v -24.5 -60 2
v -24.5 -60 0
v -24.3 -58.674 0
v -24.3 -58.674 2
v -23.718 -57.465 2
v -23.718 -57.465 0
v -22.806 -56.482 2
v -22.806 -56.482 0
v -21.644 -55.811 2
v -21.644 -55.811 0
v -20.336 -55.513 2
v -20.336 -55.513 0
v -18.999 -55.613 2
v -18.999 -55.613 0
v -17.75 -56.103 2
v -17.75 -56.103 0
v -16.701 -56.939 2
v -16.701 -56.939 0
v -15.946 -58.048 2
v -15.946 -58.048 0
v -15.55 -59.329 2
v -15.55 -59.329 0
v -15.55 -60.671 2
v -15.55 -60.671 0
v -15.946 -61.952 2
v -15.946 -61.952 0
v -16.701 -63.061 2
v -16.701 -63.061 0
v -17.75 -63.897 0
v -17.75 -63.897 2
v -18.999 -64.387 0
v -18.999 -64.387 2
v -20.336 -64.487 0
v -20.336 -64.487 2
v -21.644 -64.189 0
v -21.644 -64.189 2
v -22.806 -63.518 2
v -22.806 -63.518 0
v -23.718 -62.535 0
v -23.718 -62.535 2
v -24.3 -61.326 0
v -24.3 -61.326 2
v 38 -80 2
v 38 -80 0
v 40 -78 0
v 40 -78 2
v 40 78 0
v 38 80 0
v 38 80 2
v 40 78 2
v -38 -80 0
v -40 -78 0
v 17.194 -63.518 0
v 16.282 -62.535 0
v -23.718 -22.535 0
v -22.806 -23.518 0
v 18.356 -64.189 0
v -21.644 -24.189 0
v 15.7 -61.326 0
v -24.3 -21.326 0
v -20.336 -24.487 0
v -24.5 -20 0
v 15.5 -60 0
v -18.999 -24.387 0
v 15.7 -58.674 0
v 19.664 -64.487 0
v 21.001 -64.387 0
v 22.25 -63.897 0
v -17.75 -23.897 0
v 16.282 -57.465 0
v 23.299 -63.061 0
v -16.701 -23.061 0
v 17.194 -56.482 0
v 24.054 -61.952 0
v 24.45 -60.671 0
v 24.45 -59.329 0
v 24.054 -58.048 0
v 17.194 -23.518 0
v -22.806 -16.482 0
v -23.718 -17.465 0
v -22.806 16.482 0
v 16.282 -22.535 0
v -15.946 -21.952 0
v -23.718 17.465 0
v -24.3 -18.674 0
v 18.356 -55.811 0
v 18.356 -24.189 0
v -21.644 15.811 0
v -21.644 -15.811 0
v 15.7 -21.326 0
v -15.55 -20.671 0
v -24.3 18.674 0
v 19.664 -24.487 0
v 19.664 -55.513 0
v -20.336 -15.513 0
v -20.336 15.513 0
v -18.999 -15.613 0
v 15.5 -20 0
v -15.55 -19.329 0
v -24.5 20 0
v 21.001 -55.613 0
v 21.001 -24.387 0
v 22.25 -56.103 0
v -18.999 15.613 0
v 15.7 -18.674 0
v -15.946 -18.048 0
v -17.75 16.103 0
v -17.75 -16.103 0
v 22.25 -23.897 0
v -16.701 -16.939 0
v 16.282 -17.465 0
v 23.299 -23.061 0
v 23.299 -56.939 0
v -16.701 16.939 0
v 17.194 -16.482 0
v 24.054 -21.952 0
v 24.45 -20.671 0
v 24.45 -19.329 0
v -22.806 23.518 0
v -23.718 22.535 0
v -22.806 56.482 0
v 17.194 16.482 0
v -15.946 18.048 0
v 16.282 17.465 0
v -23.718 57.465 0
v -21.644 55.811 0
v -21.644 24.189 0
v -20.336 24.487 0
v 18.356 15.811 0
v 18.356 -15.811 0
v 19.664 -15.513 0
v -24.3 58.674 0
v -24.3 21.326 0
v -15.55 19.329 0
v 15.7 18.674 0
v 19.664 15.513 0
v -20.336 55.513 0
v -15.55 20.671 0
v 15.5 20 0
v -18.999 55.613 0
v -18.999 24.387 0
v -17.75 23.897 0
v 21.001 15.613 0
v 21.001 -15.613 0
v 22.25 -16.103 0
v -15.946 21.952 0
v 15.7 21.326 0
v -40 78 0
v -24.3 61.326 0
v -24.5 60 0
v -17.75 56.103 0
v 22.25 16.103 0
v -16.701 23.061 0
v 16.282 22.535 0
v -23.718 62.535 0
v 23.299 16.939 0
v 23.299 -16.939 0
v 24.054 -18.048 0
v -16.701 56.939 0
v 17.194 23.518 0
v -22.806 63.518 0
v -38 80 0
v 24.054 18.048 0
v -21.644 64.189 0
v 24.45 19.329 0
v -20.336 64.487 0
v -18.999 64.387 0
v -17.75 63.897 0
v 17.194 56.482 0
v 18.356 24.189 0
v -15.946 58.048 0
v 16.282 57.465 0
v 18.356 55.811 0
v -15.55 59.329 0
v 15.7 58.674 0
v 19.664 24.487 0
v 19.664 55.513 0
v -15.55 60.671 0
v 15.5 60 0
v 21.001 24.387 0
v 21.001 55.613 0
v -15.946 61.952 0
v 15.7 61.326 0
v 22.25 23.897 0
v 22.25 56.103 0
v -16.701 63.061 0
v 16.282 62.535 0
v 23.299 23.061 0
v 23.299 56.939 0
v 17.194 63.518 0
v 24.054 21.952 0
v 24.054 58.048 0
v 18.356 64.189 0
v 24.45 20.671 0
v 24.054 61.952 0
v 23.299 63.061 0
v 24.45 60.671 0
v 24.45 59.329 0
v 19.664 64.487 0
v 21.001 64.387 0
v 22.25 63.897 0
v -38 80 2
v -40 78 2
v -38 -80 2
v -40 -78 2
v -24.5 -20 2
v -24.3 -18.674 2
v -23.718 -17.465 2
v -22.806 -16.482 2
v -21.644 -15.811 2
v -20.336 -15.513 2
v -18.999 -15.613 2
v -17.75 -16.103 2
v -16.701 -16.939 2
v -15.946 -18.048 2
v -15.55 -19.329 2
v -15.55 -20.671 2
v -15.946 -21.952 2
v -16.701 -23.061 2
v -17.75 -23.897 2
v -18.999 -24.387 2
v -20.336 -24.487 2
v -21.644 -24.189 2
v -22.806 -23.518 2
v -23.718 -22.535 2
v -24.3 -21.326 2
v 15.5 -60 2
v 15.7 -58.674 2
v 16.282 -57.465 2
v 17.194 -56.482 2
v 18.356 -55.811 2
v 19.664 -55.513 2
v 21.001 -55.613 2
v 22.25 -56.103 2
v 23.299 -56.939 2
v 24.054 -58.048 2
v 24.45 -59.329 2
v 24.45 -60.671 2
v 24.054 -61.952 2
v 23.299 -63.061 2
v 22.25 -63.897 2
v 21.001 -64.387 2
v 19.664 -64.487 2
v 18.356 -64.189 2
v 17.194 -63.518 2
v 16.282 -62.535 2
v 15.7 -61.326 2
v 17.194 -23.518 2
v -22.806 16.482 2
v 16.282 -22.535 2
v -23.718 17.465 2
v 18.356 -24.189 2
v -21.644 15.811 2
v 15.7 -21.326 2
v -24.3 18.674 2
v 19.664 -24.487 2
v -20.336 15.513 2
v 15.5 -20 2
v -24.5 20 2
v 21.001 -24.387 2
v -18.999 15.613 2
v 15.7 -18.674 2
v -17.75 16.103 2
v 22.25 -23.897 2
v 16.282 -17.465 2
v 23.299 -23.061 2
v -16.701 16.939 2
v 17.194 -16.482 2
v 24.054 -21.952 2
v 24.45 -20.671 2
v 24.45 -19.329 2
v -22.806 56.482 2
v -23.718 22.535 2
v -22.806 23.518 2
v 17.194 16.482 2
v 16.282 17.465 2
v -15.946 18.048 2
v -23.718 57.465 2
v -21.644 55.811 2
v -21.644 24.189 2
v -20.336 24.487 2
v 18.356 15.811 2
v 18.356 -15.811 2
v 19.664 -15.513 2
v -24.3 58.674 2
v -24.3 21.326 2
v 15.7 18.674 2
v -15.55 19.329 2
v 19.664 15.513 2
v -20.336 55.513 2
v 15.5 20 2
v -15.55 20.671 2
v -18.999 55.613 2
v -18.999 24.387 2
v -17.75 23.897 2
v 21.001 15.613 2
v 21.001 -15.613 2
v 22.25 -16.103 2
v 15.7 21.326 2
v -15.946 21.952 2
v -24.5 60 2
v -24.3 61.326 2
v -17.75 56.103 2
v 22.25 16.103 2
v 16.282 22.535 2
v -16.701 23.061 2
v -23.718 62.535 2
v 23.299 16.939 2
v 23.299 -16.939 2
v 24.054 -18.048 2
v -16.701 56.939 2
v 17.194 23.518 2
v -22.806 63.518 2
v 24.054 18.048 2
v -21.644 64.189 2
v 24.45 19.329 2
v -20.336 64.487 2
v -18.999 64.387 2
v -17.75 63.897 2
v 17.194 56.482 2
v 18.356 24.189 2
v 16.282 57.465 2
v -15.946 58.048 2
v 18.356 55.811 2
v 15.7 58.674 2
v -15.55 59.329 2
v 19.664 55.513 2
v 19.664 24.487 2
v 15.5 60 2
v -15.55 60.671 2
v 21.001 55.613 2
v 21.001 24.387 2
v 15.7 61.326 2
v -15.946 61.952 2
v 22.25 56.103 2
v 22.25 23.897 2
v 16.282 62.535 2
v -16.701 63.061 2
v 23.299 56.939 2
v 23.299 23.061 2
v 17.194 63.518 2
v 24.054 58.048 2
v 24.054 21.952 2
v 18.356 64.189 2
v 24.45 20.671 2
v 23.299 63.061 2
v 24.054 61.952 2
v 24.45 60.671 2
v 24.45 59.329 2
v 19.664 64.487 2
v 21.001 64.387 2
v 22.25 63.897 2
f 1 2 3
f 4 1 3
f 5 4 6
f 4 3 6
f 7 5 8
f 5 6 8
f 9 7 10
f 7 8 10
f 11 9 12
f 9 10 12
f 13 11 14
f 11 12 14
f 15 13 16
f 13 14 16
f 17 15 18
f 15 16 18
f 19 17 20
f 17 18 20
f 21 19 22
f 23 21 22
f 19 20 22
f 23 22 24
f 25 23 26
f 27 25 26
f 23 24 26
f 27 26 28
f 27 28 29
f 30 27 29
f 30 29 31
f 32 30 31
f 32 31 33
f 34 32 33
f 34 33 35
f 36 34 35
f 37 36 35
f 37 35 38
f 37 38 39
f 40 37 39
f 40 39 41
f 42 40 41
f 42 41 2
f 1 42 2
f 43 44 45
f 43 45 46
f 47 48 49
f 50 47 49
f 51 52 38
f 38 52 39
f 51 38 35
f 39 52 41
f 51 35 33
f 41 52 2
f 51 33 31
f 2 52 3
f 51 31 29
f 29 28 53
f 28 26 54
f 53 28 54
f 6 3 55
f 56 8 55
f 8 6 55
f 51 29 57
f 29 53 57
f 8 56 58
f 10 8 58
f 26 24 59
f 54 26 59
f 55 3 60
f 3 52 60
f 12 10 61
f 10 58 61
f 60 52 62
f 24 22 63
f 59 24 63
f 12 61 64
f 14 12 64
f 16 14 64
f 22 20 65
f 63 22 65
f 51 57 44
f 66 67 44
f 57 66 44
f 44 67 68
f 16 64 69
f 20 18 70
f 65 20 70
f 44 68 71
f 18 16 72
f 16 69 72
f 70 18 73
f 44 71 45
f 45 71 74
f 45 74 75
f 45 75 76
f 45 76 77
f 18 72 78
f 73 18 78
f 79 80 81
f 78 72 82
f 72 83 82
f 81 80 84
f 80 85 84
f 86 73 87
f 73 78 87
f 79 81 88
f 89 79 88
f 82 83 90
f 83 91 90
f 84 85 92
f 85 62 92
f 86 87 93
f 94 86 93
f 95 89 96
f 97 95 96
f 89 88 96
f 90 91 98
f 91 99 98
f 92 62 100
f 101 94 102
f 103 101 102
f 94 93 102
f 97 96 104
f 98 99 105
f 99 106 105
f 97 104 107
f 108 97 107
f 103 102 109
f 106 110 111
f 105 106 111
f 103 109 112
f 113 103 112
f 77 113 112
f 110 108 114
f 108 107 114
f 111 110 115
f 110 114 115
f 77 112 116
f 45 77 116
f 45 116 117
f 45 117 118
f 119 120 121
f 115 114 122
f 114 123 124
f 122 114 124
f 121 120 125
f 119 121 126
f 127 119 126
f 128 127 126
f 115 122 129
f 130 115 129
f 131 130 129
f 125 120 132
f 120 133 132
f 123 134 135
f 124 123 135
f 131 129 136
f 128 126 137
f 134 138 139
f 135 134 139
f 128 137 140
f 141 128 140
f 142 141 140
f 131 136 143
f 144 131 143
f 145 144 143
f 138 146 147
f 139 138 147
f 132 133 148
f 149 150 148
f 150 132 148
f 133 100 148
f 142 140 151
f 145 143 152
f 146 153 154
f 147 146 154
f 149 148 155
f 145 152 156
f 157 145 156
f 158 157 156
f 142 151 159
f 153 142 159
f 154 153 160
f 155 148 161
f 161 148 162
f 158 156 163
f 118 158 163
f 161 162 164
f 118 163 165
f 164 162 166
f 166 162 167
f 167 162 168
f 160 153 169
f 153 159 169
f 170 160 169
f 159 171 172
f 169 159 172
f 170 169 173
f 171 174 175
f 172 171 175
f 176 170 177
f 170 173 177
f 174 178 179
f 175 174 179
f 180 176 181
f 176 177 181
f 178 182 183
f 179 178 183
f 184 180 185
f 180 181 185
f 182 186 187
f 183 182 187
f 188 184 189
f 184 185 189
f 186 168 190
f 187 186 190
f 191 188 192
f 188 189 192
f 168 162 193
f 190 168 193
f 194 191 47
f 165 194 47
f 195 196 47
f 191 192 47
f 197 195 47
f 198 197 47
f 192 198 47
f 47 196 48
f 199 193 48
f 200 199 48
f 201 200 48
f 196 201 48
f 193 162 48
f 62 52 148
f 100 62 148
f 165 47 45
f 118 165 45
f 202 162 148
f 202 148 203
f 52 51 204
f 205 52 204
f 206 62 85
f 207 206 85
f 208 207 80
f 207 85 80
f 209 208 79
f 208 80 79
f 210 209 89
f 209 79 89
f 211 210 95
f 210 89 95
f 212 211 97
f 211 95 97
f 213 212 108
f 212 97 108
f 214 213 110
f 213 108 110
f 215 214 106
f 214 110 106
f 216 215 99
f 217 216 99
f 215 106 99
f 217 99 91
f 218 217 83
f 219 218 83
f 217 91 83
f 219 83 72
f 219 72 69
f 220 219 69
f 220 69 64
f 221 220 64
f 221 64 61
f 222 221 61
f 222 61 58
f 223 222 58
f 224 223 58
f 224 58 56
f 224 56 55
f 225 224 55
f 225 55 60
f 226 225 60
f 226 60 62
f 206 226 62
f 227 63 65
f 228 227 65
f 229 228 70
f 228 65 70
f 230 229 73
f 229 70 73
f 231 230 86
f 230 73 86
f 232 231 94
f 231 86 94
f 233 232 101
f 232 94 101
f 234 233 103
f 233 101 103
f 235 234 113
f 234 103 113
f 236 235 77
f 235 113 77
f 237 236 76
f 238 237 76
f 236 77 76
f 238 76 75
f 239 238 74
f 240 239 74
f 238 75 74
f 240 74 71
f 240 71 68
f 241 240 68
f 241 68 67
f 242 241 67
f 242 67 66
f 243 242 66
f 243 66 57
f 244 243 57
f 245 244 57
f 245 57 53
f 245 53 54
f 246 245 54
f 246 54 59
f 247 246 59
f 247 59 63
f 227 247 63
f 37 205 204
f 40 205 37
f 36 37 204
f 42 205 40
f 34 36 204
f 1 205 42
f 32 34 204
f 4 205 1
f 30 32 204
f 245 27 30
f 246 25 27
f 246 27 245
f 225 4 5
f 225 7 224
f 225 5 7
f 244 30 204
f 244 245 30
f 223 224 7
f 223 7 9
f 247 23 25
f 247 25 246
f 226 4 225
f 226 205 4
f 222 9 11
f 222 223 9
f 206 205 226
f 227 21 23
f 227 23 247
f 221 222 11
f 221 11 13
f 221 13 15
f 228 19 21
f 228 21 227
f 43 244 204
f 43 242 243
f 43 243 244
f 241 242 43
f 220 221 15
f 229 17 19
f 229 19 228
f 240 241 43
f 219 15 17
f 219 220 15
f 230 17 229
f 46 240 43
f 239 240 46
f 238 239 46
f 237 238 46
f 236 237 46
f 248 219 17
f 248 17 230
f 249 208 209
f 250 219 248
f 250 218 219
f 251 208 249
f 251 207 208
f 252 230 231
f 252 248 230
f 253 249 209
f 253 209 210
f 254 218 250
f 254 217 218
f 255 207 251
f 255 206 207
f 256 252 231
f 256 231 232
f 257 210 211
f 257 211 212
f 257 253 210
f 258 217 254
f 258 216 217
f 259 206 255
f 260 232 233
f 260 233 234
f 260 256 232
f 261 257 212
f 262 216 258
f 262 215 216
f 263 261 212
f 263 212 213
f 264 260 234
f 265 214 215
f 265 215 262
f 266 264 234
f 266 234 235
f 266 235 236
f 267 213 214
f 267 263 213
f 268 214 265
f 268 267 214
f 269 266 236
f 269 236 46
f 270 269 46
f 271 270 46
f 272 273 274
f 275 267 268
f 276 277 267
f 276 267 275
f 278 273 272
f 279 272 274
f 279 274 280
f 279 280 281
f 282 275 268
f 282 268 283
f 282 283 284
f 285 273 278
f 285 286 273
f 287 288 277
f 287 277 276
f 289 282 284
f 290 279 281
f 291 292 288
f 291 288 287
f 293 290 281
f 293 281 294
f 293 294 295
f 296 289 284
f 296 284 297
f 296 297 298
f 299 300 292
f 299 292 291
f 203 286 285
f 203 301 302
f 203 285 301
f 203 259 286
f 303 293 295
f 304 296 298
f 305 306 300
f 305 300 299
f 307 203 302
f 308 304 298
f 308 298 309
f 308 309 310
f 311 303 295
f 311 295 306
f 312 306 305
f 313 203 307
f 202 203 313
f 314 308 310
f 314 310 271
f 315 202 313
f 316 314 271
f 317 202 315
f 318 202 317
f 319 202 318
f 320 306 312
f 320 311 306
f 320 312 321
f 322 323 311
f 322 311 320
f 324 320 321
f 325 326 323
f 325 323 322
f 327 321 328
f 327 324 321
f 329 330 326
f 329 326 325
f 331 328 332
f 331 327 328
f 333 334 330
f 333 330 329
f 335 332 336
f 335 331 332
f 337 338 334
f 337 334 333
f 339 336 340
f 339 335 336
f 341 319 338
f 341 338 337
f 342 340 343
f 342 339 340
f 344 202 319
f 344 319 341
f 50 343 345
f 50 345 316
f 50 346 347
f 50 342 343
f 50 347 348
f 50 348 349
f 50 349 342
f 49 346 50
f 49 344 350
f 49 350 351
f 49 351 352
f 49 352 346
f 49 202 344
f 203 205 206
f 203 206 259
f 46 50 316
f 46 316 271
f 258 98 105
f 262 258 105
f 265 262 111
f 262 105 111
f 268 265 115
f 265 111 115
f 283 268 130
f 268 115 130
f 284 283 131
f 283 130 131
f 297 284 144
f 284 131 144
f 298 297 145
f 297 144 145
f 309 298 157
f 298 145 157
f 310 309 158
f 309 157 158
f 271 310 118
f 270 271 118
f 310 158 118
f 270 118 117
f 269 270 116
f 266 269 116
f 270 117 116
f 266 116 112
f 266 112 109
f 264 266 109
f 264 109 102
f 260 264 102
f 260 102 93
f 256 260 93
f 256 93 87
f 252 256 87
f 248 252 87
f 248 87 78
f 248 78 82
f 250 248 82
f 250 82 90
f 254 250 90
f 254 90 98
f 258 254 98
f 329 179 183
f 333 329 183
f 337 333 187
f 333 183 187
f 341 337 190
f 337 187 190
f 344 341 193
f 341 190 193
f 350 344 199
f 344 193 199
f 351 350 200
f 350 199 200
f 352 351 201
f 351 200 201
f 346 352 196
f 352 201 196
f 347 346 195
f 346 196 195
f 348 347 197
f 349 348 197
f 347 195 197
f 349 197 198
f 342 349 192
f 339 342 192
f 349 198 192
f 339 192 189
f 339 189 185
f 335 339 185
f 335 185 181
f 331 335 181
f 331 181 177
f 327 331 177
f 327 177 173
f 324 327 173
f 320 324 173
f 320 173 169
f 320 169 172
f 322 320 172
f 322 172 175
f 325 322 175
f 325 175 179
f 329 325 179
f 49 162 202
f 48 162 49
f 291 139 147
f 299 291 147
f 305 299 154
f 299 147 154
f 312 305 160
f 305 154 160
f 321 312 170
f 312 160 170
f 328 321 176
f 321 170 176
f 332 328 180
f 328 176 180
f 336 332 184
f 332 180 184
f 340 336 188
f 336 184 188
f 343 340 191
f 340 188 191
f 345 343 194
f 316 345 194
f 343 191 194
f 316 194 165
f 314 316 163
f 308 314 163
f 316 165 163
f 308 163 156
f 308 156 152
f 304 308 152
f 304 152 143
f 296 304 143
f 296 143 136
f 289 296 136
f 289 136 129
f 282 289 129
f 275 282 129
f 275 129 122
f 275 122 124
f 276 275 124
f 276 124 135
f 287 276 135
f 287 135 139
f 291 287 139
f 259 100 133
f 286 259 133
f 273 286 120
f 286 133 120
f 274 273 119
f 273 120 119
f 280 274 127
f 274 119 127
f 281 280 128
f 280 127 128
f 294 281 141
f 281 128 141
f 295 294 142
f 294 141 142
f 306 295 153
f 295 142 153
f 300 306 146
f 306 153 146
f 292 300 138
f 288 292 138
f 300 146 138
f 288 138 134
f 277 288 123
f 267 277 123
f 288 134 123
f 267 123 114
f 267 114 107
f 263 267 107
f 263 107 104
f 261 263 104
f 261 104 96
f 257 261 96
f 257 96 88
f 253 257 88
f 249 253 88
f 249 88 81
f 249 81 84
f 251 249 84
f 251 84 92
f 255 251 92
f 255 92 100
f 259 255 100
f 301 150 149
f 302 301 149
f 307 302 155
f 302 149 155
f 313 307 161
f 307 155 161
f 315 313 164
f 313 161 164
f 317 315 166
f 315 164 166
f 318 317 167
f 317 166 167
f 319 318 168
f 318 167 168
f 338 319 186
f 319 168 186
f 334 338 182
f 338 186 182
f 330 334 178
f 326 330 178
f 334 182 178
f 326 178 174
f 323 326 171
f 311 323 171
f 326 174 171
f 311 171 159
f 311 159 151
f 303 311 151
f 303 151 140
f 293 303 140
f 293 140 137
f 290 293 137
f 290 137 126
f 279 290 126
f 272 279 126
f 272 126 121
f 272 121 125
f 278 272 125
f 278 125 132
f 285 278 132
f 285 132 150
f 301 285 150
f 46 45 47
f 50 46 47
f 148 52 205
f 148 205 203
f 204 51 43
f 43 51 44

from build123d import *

# Parameters (mm, degrees)
SKETCH_1_W        = 80
SKETCH_1_H        = 160
EXTRUDE_1_DEPTH   = 2
CHAMFER_1_SIZE    = 2
HOLE_WIZARD_M81_D = 9


with BuildPart() as part:
    # Эскиз1 → Бобышка-Вытянуть1 (new body)
    with BuildSketch(Plane.XY):
        Rectangle(SKETCH_1_W, SKETCH_1_H)
    extrude(amount=EXTRUDE_1_DEPTH)

    # Фаска1
    chamfer_1_edges = [part.edges().sort_by_distance(p)[0] for p in [
        (40, -80, 1),
        (-40, -80, 1),
        (-40, 80, 1),
        (40, 80, 1),
    ]]
    chamfer(chamfer_1_edges, length=CHAMFER_1_SIZE)

    # Отверстие с зазором M81 (through all)
    with Locations(Plane.XY.offset(2)):
        with Locations((-20, 20), (20, 20), (-20, -20), (20, -20), (-20, 60), (20, 60), (20, -60), (-20, -60)):
            Hole(HOLE_WIZARD_M81_D / 2)


solid = part.part
